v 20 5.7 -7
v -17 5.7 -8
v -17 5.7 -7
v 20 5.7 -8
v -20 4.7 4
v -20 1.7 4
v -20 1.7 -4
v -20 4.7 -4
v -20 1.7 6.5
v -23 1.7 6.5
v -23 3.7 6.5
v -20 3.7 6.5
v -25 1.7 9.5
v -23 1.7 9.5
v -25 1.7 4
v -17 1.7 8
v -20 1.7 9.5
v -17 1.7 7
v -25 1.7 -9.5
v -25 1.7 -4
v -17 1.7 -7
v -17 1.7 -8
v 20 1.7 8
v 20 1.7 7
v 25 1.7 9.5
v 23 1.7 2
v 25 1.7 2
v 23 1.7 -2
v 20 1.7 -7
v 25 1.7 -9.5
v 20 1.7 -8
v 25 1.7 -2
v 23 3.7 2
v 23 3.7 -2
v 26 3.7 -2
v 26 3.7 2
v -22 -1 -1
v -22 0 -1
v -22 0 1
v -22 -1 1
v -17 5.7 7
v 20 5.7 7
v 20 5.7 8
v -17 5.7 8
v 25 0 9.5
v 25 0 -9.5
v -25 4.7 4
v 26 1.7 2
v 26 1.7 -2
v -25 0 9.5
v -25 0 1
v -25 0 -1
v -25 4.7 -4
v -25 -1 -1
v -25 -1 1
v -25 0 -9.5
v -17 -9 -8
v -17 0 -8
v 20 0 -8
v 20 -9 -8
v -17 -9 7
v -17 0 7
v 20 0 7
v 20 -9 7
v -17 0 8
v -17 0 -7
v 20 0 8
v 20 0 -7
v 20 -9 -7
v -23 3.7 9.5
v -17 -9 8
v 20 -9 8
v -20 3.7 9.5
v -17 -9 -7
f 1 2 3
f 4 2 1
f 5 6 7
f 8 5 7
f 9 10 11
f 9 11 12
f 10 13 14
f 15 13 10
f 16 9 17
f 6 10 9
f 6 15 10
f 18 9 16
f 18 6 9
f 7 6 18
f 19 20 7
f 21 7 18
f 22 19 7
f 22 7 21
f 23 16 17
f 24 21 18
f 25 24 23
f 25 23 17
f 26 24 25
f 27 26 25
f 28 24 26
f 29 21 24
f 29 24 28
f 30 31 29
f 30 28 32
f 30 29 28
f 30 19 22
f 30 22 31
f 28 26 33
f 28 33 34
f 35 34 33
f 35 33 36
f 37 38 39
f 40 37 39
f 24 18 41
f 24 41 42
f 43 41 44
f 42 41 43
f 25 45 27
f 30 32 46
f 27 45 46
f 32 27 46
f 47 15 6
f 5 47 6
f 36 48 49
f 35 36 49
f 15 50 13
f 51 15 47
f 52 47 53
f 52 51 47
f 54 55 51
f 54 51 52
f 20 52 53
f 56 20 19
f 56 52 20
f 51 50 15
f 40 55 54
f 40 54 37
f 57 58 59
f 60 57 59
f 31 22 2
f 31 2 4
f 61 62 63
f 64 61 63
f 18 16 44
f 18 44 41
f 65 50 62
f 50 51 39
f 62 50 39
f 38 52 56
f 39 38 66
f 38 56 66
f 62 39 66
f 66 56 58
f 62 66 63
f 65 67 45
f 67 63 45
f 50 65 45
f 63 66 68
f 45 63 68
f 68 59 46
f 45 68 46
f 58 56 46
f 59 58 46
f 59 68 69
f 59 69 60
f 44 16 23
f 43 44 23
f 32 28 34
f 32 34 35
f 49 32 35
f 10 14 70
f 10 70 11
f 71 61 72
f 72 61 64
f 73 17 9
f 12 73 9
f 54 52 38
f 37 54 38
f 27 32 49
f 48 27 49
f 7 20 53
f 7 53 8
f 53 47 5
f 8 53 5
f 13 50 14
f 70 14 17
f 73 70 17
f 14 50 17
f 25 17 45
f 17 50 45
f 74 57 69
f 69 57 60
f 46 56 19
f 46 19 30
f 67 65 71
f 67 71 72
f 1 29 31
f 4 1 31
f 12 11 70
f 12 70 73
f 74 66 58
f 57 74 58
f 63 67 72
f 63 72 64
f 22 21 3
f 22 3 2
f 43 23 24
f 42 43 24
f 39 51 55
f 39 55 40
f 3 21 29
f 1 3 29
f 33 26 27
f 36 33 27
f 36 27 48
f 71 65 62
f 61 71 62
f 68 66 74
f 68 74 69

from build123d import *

# Parameters (mm, degrees)
SKETCH_1_W           = 50
SKETCH_1_H           = 19
EXTRUDE_1_DEPTH      = 1.7
SKETCH_2_W           = 5
SKETCH_2_H           = 8
EXTRUDE_2_DEPTH      = 3
SKETCH_3_W           = 3
SKETCH_3_H           = 3
EXTRUDE_3_DEPTH      = 2
SKETCH_4_W           = 37
SKETCH_4_H           = 1
EXTRUDE_4_DEPTH      = 4
EXTRUDE_4_DEPTH_BACK = 10.7
SKETCH_6_W           = 3
SKETCH_6_H           = 2
EXTRUDE_6_DEPTH      = 1
SKETCH_7_W           = 3
SKETCH_7_H           = 4
EXTRUDE_7_DEPTH      = 2


with BuildPart() as part:
    # Эскиз1 → Бобышка-Вытянуть1 (new body)
    with BuildSketch(Plane(origin=(0, 0, 0), x_dir=(1, 0, 0), z_dir=(0, 1, 0))):
        Rectangle(SKETCH_1_W, SKETCH_1_H)
    extrude(amount=EXTRUDE_1_DEPTH)

    # Эскиз2 → Бобышка-Вытянуть2 (add)
    with BuildSketch(Plane(origin=(0, 1.7, 0), x_dir=(1, 0, 0), z_dir=(0, 1, 0))):
        with Locations((-22.5, 0)):
            Rectangle(SKETCH_2_W, SKETCH_2_H)
    extrude(amount=EXTRUDE_2_DEPTH)

    # Эскиз3 → Бобышка-Вытянуть3 (add)
    with BuildSketch(Plane(origin=(0, 1.7, 0), x_dir=(1, 0, 0), z_dir=(0, 1, 0))):
        with Locations((-21.5, -8)):
            Rectangle(SKETCH_3_W, SKETCH_3_H)
    extrude(amount=EXTRUDE_3_DEPTH)

    # Эскиз4 → Бобышка-Вытянуть4 (add, two sides)
    with BuildSketch(Plane(origin=(0, 1.7, 0), x_dir=(1, 0, 0), z_dir=(0, 1, 0))) as extrude_4_sk:
        with Locations((1.5, 7.5)):
            Rectangle(SKETCH_4_W, SKETCH_4_H)
        with Locations((1.5, -7.5)):
            Rectangle(SKETCH_4_W, SKETCH_4_H)
    extrude(amount=EXTRUDE_4_DEPTH)
    extrude(extrude_4_sk.sketch, amount=-EXTRUDE_4_DEPTH_BACK)

    # Эскиз6 → Бобышка-Вытянуть6 (add)
    with BuildSketch(Plane.XZ):
        with Locations((-23.5, 0)):
            Rectangle(SKETCH_6_W, SKETCH_6_H)
    extrude(amount=EXTRUDE_6_DEPTH)

    # Эскиз7 → Бобышка-Вытянуть7 (add)
    with BuildSketch(Plane(origin=(0, 1.7, 0), x_dir=(1, 0, 0), z_dir=(0, 1, 0))):
        with Locations((24.5, 0)):
            Rectangle(SKETCH_7_W, SKETCH_7_H)
    extrude(amount=EXTRUDE_7_DEPTH)


solid = part.part
